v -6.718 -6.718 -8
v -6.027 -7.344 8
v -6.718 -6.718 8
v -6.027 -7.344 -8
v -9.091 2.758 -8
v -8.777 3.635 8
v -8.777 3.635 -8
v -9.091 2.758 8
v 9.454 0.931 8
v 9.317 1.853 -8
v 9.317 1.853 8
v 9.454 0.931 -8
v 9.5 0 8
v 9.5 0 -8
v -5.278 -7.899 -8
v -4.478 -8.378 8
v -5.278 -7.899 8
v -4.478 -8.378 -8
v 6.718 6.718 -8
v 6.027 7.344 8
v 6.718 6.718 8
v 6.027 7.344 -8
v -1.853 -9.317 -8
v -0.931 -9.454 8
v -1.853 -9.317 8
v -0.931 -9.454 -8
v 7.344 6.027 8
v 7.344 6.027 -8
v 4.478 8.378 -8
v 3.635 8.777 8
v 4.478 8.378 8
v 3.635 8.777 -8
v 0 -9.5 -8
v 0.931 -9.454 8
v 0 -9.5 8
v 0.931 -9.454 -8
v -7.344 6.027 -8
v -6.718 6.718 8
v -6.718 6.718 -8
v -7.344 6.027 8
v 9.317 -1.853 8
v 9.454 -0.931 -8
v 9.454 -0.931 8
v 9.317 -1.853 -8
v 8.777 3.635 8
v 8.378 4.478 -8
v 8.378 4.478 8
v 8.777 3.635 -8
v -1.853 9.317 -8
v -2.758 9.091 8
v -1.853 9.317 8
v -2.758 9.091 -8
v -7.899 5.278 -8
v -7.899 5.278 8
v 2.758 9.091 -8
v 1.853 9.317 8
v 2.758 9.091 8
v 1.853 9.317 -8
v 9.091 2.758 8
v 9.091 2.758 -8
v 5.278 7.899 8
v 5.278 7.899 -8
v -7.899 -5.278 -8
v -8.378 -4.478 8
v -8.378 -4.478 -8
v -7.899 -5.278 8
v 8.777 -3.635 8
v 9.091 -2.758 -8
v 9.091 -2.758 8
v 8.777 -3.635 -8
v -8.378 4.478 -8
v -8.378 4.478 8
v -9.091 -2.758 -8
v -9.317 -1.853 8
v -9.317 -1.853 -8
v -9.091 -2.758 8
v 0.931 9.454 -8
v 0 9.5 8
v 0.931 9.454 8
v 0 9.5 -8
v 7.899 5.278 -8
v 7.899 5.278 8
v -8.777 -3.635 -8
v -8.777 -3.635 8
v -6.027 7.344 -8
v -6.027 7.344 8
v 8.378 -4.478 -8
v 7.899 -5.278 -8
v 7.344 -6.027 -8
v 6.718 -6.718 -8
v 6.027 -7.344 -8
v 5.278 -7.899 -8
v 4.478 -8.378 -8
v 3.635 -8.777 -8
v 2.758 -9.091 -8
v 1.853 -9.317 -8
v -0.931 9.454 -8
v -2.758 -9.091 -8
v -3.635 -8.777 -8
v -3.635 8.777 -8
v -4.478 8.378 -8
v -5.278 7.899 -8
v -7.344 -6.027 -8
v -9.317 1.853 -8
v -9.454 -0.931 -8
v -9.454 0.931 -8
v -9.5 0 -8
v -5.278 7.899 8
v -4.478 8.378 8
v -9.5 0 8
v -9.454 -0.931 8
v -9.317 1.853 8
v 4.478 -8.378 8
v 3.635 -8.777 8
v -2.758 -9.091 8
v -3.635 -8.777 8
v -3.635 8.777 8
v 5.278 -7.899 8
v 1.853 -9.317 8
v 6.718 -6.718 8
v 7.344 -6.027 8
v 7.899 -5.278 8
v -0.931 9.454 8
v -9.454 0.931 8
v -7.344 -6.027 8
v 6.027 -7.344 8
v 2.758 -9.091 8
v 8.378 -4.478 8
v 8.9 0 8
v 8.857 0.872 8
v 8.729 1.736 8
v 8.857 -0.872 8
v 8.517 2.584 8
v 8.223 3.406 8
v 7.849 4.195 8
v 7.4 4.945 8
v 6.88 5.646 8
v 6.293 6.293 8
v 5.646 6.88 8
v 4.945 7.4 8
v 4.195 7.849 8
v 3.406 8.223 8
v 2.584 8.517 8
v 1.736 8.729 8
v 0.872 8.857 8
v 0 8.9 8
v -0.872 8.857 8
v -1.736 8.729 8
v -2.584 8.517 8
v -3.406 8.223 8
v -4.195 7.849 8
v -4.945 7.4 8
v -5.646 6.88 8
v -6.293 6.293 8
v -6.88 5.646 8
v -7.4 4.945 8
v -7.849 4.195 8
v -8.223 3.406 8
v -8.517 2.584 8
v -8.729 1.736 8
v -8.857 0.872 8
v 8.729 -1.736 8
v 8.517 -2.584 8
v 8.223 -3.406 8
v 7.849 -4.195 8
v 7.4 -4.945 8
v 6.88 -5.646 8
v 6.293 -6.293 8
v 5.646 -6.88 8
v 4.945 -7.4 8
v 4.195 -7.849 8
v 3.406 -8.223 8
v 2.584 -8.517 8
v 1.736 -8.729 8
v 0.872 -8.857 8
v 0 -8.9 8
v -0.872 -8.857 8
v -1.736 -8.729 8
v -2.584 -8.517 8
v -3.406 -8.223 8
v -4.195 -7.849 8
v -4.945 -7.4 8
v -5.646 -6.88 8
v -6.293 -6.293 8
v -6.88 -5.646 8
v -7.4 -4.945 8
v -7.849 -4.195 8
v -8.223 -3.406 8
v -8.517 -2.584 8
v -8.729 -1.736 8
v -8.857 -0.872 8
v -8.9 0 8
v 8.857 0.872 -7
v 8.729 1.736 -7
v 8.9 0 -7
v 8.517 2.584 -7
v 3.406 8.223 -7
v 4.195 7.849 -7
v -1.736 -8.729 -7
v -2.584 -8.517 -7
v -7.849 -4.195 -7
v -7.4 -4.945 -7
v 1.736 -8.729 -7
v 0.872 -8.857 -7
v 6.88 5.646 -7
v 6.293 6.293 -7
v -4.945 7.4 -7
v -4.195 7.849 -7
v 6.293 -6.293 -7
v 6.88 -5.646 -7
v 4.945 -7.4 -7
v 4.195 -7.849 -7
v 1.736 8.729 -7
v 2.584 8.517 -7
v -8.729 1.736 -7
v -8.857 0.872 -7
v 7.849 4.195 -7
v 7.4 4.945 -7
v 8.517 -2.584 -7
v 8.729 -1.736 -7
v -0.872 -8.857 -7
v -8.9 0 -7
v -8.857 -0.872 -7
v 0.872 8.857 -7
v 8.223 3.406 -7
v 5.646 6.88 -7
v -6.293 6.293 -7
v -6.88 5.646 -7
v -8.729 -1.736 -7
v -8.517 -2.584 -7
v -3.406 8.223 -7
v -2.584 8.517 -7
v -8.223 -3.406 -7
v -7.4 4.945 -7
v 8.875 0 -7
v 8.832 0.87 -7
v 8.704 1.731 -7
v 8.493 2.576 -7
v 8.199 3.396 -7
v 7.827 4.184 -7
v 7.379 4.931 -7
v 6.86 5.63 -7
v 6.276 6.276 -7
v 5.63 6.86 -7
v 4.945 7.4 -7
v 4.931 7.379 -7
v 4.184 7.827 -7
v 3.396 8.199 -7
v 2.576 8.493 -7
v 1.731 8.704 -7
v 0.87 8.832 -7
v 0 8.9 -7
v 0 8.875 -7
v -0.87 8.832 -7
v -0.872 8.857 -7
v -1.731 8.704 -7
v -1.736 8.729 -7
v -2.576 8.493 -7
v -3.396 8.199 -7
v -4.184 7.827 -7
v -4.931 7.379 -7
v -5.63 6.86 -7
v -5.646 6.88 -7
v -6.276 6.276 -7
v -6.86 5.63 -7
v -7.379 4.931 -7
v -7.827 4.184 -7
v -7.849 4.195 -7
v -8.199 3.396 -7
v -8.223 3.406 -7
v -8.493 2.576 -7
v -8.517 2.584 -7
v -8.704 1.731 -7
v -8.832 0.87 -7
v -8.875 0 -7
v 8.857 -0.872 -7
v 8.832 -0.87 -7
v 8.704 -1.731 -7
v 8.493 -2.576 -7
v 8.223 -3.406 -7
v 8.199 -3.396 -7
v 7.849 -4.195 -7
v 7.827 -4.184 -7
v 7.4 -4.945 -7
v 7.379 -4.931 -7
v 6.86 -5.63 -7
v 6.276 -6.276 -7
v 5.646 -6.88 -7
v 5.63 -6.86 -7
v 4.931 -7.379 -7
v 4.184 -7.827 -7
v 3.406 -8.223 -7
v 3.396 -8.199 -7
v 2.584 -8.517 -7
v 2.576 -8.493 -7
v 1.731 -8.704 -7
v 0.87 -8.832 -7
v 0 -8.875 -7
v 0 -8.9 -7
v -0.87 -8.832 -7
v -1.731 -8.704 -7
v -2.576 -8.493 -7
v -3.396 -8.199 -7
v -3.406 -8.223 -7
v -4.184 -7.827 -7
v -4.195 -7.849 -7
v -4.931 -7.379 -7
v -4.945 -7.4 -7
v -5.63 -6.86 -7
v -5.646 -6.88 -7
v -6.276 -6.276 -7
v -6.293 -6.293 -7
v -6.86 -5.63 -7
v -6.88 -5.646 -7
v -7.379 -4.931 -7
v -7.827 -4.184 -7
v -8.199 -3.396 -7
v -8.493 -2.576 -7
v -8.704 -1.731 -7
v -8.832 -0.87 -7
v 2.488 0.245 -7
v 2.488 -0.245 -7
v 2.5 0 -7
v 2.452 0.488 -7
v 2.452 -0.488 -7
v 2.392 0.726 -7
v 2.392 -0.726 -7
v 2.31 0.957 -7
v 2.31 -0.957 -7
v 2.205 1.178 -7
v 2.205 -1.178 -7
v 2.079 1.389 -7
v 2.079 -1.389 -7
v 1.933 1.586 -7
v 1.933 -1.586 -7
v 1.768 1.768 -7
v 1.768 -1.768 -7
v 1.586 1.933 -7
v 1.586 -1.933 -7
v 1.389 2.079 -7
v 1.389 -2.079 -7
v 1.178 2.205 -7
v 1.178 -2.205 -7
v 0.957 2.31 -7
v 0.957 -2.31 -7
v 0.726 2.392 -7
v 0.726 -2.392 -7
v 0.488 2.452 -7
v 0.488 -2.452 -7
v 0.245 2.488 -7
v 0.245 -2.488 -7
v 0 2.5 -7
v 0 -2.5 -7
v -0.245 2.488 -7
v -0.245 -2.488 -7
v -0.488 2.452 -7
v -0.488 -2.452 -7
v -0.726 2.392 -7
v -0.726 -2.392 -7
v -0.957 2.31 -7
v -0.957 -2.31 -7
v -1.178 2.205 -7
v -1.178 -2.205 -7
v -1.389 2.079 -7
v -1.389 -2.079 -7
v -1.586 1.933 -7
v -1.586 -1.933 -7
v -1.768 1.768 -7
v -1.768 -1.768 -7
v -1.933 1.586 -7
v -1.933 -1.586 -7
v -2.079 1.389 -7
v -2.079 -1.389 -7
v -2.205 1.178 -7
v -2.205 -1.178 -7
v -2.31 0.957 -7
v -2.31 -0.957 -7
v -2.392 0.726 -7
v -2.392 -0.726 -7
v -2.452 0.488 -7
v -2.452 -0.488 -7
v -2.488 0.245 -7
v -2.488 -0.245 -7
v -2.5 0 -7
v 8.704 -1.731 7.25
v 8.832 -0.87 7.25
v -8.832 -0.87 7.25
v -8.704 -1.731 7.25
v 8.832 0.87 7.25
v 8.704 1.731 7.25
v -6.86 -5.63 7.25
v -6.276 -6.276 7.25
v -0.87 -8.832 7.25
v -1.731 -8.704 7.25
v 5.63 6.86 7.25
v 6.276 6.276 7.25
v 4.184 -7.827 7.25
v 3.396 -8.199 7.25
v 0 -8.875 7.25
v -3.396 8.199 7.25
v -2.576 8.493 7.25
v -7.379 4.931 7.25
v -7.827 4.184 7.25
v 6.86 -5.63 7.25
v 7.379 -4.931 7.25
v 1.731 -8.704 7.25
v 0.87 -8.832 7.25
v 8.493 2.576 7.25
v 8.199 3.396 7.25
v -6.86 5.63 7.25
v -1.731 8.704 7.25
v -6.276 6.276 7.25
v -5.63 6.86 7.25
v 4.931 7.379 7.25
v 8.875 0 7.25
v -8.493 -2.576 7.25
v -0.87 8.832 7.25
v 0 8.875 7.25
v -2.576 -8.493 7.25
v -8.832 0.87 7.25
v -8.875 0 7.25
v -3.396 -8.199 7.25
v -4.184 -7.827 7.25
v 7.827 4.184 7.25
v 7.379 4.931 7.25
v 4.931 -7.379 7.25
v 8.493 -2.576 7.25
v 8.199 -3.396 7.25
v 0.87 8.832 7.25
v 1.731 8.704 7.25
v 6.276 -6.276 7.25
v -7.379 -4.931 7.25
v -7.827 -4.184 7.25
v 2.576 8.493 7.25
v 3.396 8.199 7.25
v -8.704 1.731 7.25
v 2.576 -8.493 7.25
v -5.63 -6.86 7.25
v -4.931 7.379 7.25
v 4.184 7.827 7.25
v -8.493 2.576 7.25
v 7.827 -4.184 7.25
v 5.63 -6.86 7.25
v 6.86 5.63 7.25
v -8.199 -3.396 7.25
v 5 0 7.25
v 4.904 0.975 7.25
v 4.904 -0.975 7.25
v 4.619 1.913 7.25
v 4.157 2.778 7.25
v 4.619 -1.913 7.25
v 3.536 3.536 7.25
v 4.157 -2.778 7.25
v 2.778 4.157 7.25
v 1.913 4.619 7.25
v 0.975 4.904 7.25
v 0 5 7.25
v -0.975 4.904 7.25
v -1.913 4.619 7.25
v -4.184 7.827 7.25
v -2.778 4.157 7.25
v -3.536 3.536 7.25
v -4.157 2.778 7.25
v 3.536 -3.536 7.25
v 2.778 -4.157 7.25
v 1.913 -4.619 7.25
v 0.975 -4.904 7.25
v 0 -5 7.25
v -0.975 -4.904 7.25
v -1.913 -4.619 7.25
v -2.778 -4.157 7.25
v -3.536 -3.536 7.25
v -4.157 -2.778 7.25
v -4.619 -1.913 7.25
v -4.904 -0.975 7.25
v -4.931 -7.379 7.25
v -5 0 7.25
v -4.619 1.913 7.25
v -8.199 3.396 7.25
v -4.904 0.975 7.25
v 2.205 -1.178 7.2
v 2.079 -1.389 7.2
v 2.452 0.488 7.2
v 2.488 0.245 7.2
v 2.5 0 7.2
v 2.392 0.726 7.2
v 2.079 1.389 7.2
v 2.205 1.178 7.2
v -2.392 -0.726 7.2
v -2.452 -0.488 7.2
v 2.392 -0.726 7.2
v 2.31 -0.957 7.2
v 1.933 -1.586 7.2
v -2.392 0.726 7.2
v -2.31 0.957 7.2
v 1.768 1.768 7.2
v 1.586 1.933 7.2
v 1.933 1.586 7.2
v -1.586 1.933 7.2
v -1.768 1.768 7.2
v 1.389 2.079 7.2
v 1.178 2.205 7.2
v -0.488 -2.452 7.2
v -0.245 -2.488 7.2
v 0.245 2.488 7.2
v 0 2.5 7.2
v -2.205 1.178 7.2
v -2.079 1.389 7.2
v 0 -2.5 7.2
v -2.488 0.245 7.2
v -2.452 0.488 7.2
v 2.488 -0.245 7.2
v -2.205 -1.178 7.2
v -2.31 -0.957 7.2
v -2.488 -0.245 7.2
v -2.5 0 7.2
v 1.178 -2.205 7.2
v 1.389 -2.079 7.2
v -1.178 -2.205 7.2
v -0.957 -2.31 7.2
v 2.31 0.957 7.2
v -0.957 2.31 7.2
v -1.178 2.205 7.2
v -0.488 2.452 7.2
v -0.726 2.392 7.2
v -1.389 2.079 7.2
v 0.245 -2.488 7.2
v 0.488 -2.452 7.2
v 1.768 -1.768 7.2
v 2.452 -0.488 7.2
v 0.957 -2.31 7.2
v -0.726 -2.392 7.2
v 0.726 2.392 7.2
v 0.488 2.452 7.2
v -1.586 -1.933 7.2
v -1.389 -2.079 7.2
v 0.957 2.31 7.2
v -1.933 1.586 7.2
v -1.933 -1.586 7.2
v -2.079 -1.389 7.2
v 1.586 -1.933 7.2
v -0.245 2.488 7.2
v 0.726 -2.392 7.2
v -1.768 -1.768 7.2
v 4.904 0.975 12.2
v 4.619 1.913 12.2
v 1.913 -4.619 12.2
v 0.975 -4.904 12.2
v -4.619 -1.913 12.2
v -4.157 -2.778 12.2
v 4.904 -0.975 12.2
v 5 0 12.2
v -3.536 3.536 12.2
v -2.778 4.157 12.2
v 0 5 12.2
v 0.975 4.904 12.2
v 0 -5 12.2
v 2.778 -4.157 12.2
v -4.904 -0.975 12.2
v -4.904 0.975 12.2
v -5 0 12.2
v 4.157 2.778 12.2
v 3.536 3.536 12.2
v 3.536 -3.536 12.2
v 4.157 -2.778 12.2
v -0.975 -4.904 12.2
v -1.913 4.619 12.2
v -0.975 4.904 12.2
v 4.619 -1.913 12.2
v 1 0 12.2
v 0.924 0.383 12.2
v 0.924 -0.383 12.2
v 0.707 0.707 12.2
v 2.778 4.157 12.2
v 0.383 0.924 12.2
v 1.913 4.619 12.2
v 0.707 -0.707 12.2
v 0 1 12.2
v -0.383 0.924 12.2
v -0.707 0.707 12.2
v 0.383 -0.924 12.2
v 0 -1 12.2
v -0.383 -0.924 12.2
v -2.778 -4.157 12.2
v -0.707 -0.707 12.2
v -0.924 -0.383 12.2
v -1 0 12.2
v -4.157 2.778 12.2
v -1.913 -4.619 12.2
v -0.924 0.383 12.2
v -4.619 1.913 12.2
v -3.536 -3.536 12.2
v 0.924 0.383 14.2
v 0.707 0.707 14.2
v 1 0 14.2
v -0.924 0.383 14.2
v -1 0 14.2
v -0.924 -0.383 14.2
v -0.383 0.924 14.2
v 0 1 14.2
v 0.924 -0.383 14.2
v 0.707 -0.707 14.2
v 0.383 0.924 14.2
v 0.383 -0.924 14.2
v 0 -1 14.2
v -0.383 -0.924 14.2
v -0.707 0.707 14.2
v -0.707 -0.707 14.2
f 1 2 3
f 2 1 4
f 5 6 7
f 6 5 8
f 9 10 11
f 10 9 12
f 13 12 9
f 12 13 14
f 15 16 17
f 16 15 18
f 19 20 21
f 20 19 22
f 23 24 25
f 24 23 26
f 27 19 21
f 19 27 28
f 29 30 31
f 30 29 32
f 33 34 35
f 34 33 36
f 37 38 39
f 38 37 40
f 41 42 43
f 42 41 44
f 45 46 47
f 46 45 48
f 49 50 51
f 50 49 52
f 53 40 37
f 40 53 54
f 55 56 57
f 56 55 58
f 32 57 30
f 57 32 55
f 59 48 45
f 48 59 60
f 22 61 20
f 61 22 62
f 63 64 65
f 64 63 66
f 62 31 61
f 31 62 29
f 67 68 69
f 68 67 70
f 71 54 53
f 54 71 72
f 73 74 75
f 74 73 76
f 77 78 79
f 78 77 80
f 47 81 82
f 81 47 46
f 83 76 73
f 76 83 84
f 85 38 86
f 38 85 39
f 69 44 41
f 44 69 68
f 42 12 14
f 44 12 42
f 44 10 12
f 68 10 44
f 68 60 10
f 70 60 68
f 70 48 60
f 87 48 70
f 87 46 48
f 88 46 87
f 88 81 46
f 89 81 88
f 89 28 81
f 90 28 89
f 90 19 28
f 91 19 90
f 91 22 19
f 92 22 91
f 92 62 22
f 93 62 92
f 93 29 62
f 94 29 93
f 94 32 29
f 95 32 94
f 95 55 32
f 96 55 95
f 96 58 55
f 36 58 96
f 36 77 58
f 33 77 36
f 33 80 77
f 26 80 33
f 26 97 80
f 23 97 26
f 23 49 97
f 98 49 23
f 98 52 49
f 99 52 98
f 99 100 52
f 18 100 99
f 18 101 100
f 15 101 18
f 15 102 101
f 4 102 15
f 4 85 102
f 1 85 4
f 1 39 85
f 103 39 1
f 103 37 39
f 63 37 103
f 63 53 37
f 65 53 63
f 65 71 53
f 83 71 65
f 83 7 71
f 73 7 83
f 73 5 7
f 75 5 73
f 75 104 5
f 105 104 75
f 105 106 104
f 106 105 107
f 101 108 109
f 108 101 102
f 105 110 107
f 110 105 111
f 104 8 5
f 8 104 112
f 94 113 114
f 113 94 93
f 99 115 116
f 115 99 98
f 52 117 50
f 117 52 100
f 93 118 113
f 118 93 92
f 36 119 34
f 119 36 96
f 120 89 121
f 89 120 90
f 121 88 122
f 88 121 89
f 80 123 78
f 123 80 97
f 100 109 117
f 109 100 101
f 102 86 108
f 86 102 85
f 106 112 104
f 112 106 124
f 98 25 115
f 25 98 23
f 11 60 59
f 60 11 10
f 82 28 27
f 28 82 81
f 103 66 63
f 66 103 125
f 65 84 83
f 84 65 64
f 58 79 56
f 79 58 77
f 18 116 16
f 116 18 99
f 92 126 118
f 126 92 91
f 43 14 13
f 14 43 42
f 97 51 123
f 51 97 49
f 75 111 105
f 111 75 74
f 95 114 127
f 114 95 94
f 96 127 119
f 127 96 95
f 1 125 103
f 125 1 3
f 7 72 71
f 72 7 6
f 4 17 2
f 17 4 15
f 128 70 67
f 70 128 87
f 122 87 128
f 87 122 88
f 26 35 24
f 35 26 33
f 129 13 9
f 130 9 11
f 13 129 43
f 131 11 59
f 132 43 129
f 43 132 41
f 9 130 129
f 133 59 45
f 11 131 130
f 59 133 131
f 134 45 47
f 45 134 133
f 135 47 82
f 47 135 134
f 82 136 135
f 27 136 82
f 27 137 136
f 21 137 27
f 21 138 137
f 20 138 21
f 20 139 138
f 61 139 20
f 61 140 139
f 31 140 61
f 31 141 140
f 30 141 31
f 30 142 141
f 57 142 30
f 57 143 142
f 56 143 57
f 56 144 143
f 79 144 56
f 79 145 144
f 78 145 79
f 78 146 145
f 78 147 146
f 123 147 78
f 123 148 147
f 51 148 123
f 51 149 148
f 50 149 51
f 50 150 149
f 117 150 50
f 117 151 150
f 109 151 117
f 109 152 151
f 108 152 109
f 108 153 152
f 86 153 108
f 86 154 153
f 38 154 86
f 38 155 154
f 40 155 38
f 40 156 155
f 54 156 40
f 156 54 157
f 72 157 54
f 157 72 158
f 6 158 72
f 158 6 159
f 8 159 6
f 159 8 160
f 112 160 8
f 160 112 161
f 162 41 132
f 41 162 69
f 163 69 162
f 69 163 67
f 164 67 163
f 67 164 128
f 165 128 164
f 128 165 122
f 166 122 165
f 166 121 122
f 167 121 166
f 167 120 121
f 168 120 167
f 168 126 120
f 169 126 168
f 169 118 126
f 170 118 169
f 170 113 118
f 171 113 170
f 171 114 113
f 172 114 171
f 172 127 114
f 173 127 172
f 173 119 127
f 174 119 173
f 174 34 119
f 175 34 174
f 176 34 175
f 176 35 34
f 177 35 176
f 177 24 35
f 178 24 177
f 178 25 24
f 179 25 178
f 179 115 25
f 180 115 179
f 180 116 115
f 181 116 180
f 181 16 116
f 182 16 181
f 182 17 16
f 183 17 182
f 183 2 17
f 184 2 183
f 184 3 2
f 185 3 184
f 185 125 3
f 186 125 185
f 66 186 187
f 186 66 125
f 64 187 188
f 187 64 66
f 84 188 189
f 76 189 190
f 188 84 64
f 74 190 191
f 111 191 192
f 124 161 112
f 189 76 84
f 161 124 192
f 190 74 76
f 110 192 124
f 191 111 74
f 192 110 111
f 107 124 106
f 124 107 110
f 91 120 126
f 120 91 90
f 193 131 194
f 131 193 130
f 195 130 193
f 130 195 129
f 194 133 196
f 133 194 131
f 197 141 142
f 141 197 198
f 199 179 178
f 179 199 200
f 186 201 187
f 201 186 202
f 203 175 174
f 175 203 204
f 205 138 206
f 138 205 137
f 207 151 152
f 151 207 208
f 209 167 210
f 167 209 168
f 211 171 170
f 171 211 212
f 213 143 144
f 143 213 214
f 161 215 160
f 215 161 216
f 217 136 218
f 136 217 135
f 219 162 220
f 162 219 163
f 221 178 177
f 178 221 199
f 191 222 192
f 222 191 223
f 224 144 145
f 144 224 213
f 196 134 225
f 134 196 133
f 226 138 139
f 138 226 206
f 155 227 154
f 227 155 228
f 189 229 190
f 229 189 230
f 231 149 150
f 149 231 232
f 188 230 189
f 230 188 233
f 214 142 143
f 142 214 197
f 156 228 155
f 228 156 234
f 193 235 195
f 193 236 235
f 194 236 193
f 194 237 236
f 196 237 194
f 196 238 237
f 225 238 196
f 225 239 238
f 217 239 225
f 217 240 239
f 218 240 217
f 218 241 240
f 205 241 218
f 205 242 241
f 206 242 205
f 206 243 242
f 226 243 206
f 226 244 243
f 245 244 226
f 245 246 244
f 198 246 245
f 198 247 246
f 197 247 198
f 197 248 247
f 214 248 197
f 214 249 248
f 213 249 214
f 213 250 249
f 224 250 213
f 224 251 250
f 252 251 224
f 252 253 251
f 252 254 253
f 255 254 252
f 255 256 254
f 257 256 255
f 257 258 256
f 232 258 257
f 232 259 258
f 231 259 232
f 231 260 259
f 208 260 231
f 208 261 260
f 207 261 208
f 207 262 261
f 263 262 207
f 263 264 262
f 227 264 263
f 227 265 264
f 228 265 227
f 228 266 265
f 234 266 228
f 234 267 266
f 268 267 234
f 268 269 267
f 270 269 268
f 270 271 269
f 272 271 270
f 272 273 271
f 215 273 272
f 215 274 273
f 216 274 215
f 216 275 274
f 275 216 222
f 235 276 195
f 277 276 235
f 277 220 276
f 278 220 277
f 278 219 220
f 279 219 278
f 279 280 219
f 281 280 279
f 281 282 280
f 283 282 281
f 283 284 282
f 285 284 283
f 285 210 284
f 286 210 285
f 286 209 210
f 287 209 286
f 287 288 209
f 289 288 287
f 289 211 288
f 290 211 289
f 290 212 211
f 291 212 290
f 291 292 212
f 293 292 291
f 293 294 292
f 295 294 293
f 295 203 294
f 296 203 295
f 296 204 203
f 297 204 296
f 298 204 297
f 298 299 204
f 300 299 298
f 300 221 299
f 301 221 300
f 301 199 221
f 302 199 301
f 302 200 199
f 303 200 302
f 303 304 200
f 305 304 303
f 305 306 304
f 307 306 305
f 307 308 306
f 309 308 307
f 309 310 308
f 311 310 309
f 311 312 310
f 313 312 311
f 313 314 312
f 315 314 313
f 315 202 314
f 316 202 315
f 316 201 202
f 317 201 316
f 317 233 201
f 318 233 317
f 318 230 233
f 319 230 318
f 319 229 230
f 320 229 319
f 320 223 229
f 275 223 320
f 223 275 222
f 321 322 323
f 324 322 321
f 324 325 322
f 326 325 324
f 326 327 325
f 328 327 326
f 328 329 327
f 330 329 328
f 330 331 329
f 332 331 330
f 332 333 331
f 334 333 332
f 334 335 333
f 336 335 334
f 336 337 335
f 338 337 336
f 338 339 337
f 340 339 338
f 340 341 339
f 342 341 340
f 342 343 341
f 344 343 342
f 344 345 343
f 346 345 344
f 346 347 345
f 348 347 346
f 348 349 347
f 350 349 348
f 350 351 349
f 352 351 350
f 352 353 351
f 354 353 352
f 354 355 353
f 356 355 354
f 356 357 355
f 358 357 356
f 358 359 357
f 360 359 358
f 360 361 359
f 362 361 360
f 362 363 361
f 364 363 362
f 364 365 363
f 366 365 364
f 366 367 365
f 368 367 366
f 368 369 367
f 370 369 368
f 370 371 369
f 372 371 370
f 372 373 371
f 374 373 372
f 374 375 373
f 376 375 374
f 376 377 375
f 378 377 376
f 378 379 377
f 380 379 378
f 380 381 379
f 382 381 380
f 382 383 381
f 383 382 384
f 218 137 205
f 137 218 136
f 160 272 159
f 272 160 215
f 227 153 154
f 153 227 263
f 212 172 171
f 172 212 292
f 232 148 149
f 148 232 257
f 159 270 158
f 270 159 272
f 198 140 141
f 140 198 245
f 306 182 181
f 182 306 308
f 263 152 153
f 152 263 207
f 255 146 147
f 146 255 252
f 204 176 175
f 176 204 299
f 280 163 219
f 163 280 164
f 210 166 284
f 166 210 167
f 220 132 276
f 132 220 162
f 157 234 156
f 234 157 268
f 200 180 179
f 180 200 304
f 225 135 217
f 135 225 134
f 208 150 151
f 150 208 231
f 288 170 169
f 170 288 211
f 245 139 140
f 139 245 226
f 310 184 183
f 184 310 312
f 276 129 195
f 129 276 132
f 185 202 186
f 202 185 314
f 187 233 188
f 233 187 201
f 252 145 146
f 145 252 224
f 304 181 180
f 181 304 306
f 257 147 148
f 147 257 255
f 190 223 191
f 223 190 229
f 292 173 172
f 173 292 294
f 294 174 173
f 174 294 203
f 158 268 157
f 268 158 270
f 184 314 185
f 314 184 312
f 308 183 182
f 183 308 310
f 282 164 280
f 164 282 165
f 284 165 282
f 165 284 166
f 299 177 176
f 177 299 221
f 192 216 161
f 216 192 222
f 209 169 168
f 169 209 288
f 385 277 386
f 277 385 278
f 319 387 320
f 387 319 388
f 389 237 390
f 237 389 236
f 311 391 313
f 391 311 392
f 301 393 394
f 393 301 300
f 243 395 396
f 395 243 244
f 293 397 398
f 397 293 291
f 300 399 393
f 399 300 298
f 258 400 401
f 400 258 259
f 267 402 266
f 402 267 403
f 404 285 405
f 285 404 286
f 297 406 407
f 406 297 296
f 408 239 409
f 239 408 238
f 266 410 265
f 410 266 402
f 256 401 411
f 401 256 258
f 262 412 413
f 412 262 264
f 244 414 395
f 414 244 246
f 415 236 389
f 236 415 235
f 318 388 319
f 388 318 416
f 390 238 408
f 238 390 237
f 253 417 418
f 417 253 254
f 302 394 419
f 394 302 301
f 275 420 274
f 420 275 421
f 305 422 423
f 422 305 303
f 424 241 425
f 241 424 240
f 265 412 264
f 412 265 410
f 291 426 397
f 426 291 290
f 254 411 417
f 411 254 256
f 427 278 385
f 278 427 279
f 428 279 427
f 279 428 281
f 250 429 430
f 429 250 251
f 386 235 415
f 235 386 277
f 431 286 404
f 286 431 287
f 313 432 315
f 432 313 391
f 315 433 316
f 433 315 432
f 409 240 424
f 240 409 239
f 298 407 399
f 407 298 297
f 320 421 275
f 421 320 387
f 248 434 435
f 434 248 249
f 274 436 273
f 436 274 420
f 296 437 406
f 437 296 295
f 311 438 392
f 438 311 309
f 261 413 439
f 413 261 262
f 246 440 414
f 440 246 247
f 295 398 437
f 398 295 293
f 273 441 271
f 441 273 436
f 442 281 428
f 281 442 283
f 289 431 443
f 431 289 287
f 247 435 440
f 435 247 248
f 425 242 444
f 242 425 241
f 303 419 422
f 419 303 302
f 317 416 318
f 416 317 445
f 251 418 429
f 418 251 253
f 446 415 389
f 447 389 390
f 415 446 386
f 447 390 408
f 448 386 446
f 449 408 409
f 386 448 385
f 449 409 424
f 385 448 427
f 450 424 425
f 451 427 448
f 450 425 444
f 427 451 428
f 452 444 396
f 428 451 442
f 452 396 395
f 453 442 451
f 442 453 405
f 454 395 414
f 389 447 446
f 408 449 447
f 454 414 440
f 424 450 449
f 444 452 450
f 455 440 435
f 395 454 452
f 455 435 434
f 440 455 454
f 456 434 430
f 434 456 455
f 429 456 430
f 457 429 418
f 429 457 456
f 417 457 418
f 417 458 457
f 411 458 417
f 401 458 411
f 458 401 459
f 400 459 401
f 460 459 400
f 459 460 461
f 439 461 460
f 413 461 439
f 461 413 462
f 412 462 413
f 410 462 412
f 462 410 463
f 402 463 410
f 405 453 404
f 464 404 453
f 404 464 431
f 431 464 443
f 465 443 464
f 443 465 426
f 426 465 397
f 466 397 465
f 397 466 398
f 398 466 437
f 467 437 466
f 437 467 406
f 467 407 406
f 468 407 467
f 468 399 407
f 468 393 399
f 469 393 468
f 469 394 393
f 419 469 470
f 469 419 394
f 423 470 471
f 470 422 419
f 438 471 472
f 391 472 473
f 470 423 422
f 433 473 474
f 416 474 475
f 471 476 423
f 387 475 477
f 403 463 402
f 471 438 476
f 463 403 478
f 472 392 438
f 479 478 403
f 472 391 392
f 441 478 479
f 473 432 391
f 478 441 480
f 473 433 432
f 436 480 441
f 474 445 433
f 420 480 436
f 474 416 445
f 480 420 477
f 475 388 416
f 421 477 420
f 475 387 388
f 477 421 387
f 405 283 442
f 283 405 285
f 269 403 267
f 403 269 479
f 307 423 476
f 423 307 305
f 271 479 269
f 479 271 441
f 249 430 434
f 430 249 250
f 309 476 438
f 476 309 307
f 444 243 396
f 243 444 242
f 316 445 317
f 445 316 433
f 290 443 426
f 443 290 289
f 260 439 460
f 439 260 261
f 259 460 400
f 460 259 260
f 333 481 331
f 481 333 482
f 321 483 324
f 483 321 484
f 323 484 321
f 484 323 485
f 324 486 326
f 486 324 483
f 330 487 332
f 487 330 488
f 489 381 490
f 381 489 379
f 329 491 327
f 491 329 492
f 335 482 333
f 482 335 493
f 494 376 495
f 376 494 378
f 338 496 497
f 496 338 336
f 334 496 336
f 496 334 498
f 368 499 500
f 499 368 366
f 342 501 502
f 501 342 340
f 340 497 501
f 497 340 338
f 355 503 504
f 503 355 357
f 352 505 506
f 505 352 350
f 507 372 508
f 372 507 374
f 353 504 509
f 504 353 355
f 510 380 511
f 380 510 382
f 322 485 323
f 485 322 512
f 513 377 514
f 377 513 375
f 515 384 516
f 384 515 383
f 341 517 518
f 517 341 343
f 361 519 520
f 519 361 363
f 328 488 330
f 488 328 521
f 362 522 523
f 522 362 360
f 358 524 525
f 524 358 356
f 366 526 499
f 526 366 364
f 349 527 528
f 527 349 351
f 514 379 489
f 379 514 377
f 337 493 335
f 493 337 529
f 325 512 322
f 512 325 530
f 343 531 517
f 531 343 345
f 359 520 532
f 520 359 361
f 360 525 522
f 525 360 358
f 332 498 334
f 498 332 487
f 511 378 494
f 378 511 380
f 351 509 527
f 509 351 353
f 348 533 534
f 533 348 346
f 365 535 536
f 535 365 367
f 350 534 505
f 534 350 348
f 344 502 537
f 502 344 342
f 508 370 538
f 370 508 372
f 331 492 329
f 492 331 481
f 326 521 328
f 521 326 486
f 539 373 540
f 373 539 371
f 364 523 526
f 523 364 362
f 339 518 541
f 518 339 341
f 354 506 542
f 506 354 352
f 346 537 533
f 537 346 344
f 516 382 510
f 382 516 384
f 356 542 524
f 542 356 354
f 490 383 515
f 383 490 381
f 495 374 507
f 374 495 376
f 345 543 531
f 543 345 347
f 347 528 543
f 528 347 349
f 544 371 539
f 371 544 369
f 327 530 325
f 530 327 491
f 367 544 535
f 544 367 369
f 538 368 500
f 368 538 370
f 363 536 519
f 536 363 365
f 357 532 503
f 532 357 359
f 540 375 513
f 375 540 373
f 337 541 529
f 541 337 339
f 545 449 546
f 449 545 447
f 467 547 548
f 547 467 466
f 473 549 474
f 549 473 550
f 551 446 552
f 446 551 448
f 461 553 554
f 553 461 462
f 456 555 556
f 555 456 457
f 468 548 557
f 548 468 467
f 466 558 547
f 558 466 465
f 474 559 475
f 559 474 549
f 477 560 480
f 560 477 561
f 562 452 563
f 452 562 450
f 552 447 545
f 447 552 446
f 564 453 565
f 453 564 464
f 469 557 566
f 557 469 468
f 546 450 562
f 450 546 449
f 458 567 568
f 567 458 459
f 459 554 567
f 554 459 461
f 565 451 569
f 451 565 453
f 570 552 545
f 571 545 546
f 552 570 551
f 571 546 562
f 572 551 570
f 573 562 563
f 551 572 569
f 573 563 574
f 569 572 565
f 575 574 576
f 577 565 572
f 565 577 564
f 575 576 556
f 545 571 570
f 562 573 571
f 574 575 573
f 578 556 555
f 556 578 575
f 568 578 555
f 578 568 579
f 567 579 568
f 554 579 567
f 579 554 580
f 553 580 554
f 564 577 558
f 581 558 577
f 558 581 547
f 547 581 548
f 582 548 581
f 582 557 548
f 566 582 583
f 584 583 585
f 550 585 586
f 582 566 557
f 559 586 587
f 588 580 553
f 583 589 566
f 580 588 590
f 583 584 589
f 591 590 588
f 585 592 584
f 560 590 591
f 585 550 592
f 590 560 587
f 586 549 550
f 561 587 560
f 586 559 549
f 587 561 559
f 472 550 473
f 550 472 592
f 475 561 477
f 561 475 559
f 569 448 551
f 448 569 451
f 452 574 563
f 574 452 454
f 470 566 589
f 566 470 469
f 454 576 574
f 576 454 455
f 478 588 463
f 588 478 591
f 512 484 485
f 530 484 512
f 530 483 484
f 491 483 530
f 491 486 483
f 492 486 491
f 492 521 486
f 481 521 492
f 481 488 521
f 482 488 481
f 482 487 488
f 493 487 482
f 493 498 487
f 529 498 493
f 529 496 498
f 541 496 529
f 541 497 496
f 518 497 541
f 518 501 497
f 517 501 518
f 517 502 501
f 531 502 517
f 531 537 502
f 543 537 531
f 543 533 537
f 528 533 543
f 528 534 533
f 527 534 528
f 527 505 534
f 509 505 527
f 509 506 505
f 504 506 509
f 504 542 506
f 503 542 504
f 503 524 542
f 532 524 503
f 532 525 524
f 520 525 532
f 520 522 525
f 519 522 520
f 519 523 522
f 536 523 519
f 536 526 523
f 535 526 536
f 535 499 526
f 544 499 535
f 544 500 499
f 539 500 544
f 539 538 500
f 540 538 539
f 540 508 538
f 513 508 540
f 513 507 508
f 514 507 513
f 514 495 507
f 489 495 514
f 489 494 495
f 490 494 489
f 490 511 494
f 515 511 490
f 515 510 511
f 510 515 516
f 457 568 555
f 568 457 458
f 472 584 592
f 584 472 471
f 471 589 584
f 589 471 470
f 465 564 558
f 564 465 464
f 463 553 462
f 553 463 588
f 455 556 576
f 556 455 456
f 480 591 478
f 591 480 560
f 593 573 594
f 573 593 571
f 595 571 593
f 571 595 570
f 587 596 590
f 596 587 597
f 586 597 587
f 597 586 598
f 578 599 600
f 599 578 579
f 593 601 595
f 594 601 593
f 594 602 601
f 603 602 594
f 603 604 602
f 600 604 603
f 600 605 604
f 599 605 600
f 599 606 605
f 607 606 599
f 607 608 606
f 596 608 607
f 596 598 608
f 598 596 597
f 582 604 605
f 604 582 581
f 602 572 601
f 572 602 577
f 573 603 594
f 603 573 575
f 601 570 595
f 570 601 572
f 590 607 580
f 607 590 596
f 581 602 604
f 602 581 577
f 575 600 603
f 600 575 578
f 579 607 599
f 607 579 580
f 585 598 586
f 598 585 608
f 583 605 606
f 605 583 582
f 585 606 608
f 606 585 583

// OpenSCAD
// Parameters
stator_diameter_mm = 17.75; //[9:36:0.05]
stator_height_mm = 14.5; //[7:30:0.1]
stator_inner_bore_diameter_mm = 5; //[0:12:0.05]
housing_outer_diameter_mm = 19; //[10:40:0.05]
housing_height_mm = 16; //[8:40:0.1]
base_thickness_mm = 1; //[0.5:3:0.05]
clearance_mm = 0.2; //[0:1:0.05]
housing_wall_thickness_mm = 0.6; //[0.3:2:0.05]
overlap_mm = 0.8; //[0.2:2:0.05]
buzzer_diameter_mm = 10; //[5:20:0.1]
buzzer_height_mm = 5; //[2:12:0.1]
buzzer_pin_diameter_mm = 2; //[1:4:0.05]
buzzer_pin_height_mm = 2; //[0.5:6:0.1]

// Buzzer - complete geometry
module buzzer() {
  color([0.2, 0.2, 0.2]) {
    // Buzzer body
    translate([0, 0, housing_height_mm/2 + buzzer_height_mm/2 - overlap_mm])
      cylinder(r=buzzer_diameter_mm/2, h=buzzer_height_mm, center=true, $fn=32);
    // Buzzer pin
    translate([0, 0, housing_height_mm/2 + buzzer_height_mm - overlap_mm + buzzer_pin_height_mm/2])
      cylinder(r=buzzer_pin_diameter_mm/2, h=buzzer_pin_height_mm, center=true, $fn=16);
  }
}

// Assembly
module assembly() {
  // Outer housing can
  color([0.75, 0.75, 0.77]) {
    difference() {
      translate([0, 0, 0])
        cylinder(r=housing_outer_diameter_mm/2, h=housing_height_mm, center=true, $fn=64);
      translate([0, 0, base_thickness_mm/2])
        cylinder(r=housing_outer_diameter_mm/2 - housing_wall_thickness_mm, h=housing_height_mm - base_thickness_mm, center=true, $fn=64);
    }
  }
  
  // Mounting base face
  translate([0, 0, -housing_height_mm/2 + base_thickness_mm/2])
    cylinder(r=housing_outer_diameter_mm/2, h=base_thickness_mm, center=true, $fn=64);
  
  // Stator with bore
  color([0.4, 0.4, 0.43]) {
    difference() {
      translate([0, 0, 0])
        cylinder(r=stator_diameter_mm/2, h=stator_height_mm, center=true, $fn=64);
      translate([0, 0, 0])
        cylinder(r=max(stator_inner_bore_diameter_mm/2, clearance_mm/2), h=stator_height_mm + 2*overlap_mm, center=true, $fn=64);
    }
  }
  
  // Buzzer
  buzzer();
}

assembly();
